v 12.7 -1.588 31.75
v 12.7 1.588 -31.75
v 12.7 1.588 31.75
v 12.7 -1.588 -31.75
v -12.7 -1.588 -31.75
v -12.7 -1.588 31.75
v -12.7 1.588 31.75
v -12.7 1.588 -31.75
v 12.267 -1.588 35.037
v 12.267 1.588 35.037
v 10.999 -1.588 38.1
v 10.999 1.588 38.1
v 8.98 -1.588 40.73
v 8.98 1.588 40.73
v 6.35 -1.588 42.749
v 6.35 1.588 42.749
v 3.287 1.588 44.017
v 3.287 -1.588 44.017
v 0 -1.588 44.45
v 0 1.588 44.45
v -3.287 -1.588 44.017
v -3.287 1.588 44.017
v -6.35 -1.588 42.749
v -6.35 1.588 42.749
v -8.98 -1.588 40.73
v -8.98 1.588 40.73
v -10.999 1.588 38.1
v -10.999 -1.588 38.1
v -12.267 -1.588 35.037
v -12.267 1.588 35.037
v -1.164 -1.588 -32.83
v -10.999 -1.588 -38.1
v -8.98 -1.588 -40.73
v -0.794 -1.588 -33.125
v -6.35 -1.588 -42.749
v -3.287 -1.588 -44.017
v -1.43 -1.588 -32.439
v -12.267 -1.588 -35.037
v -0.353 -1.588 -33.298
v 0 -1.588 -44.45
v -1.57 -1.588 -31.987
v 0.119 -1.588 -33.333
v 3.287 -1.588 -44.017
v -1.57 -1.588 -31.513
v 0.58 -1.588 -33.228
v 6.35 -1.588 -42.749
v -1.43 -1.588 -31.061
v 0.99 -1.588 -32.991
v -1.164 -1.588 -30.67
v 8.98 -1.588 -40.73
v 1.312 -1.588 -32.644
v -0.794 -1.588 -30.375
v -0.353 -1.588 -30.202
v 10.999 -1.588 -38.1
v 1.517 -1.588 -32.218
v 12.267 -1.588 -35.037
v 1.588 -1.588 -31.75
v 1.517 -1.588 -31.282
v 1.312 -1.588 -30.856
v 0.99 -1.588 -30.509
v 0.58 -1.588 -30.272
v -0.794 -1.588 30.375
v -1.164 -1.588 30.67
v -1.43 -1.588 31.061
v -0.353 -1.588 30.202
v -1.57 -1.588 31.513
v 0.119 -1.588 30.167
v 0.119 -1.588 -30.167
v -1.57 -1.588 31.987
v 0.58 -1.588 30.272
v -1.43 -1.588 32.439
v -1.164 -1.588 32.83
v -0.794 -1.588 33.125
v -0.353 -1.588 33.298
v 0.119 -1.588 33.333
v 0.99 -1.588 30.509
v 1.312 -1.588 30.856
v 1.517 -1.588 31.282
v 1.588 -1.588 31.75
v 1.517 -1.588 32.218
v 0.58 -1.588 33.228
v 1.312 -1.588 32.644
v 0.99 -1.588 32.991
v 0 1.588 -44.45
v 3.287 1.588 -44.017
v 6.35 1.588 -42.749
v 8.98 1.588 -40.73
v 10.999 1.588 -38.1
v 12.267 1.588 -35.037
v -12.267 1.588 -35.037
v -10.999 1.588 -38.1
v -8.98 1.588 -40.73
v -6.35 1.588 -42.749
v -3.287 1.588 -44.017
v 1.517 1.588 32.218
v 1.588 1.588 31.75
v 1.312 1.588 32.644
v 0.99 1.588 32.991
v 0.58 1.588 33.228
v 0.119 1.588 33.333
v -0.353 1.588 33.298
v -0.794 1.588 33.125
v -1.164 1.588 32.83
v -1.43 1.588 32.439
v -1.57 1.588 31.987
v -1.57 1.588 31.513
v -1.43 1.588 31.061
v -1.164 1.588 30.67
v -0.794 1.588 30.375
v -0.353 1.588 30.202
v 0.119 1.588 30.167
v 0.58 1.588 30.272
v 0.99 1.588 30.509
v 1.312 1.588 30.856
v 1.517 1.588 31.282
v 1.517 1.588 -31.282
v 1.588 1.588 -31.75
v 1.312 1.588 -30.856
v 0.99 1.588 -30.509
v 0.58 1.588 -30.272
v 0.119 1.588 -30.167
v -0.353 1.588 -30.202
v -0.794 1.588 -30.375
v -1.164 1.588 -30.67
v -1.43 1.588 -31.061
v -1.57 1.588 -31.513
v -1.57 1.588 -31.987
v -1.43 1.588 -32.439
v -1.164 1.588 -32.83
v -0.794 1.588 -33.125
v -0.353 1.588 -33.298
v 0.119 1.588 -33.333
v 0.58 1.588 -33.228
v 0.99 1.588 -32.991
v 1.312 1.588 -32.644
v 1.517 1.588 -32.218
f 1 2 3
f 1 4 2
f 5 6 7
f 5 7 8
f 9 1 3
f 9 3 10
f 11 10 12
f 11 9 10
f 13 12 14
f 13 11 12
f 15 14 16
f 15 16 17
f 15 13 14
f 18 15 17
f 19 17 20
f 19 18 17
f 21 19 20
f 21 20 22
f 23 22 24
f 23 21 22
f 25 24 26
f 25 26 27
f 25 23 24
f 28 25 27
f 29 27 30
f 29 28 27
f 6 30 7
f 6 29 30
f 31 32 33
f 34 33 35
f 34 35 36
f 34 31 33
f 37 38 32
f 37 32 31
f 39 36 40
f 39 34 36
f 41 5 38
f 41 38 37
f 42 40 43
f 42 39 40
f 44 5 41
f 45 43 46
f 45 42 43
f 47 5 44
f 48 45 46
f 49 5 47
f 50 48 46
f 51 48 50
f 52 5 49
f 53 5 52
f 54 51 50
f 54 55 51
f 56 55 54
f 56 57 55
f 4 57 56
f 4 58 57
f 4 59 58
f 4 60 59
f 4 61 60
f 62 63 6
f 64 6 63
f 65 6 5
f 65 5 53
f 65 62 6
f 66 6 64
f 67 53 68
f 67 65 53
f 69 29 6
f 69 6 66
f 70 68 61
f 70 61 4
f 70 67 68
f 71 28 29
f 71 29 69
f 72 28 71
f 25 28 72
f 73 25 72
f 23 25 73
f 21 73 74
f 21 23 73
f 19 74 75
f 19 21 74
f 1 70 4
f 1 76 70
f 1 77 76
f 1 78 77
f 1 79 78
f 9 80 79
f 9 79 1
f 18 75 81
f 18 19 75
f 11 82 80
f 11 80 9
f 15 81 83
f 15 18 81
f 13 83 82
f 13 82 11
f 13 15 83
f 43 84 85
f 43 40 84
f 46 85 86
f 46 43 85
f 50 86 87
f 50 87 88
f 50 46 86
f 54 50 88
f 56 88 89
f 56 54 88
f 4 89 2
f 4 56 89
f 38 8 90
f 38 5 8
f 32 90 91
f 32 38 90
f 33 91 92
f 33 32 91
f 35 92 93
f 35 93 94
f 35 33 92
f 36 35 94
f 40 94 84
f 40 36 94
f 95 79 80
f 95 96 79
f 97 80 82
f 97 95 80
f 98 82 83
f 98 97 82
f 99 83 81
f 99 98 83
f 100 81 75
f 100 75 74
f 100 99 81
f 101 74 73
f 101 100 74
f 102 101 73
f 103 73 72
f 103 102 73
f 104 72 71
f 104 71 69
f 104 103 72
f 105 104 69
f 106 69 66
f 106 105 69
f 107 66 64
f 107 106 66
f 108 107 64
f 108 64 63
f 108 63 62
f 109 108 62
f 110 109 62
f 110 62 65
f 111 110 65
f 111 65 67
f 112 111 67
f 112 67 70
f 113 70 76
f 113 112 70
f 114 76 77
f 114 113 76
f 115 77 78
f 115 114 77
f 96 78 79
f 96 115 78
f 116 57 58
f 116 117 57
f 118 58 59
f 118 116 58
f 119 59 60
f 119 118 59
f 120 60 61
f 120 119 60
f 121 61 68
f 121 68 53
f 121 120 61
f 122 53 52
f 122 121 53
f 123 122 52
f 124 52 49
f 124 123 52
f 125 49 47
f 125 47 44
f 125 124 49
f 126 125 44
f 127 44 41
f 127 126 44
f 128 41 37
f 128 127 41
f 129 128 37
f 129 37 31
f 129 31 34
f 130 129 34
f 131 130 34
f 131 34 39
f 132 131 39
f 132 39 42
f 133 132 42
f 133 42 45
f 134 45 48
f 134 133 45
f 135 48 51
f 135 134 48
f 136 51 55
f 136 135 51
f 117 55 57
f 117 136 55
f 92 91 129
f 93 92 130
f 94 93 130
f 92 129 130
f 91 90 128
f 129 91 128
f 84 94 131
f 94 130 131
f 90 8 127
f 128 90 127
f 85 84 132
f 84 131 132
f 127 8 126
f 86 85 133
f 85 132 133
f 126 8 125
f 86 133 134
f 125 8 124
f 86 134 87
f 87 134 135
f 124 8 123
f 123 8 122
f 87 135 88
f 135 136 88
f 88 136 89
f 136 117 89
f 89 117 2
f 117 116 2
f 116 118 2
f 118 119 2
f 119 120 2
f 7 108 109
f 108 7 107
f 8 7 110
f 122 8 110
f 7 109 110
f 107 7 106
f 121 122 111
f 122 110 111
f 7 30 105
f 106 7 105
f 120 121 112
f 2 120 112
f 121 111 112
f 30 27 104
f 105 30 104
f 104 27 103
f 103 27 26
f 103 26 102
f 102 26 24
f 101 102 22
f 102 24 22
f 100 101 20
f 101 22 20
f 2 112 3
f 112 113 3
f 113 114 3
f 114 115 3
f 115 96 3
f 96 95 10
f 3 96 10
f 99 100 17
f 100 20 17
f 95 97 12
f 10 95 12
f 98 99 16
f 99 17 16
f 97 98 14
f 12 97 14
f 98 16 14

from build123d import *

# Parameters (mm, degrees)
F0_R     = 1.5875
F1_DEPTH = 1.5875


with BuildPart() as f1:
    # F0 (on Front) → F1 (new body, symmetric)
    with BuildSketch(Plane.XZ):
        with BuildLine():
            Line((12.7, -31.75), (12.7, 31.75))
            ThreePointArc((12.7, 31.75), (8.980256, 40.730256), (0, 44.45))
            ThreePointArc((0, 44.45), (-8.980256, 40.730256), (-12.7, 31.75))
            Line((-12.7, 31.75), (-12.7, -31.75))
            ThreePointArc((-12.7, -31.75), (-8.980256, -40.730256), (0, -44.45))
            ThreePointArc((0, -44.45), (8.980256, -40.730256), (12.7, -31.75))
        make_face()
        with Locations((0, -31.75)):
            Circle(F0_R, mode=Mode.SUBTRACT)
        with Locations((0, 31.75)):
            Circle(F0_R, mode=Mode.SUBTRACT)
    extrude(amount=F1_DEPTH, both=True)


solid = f1.part
